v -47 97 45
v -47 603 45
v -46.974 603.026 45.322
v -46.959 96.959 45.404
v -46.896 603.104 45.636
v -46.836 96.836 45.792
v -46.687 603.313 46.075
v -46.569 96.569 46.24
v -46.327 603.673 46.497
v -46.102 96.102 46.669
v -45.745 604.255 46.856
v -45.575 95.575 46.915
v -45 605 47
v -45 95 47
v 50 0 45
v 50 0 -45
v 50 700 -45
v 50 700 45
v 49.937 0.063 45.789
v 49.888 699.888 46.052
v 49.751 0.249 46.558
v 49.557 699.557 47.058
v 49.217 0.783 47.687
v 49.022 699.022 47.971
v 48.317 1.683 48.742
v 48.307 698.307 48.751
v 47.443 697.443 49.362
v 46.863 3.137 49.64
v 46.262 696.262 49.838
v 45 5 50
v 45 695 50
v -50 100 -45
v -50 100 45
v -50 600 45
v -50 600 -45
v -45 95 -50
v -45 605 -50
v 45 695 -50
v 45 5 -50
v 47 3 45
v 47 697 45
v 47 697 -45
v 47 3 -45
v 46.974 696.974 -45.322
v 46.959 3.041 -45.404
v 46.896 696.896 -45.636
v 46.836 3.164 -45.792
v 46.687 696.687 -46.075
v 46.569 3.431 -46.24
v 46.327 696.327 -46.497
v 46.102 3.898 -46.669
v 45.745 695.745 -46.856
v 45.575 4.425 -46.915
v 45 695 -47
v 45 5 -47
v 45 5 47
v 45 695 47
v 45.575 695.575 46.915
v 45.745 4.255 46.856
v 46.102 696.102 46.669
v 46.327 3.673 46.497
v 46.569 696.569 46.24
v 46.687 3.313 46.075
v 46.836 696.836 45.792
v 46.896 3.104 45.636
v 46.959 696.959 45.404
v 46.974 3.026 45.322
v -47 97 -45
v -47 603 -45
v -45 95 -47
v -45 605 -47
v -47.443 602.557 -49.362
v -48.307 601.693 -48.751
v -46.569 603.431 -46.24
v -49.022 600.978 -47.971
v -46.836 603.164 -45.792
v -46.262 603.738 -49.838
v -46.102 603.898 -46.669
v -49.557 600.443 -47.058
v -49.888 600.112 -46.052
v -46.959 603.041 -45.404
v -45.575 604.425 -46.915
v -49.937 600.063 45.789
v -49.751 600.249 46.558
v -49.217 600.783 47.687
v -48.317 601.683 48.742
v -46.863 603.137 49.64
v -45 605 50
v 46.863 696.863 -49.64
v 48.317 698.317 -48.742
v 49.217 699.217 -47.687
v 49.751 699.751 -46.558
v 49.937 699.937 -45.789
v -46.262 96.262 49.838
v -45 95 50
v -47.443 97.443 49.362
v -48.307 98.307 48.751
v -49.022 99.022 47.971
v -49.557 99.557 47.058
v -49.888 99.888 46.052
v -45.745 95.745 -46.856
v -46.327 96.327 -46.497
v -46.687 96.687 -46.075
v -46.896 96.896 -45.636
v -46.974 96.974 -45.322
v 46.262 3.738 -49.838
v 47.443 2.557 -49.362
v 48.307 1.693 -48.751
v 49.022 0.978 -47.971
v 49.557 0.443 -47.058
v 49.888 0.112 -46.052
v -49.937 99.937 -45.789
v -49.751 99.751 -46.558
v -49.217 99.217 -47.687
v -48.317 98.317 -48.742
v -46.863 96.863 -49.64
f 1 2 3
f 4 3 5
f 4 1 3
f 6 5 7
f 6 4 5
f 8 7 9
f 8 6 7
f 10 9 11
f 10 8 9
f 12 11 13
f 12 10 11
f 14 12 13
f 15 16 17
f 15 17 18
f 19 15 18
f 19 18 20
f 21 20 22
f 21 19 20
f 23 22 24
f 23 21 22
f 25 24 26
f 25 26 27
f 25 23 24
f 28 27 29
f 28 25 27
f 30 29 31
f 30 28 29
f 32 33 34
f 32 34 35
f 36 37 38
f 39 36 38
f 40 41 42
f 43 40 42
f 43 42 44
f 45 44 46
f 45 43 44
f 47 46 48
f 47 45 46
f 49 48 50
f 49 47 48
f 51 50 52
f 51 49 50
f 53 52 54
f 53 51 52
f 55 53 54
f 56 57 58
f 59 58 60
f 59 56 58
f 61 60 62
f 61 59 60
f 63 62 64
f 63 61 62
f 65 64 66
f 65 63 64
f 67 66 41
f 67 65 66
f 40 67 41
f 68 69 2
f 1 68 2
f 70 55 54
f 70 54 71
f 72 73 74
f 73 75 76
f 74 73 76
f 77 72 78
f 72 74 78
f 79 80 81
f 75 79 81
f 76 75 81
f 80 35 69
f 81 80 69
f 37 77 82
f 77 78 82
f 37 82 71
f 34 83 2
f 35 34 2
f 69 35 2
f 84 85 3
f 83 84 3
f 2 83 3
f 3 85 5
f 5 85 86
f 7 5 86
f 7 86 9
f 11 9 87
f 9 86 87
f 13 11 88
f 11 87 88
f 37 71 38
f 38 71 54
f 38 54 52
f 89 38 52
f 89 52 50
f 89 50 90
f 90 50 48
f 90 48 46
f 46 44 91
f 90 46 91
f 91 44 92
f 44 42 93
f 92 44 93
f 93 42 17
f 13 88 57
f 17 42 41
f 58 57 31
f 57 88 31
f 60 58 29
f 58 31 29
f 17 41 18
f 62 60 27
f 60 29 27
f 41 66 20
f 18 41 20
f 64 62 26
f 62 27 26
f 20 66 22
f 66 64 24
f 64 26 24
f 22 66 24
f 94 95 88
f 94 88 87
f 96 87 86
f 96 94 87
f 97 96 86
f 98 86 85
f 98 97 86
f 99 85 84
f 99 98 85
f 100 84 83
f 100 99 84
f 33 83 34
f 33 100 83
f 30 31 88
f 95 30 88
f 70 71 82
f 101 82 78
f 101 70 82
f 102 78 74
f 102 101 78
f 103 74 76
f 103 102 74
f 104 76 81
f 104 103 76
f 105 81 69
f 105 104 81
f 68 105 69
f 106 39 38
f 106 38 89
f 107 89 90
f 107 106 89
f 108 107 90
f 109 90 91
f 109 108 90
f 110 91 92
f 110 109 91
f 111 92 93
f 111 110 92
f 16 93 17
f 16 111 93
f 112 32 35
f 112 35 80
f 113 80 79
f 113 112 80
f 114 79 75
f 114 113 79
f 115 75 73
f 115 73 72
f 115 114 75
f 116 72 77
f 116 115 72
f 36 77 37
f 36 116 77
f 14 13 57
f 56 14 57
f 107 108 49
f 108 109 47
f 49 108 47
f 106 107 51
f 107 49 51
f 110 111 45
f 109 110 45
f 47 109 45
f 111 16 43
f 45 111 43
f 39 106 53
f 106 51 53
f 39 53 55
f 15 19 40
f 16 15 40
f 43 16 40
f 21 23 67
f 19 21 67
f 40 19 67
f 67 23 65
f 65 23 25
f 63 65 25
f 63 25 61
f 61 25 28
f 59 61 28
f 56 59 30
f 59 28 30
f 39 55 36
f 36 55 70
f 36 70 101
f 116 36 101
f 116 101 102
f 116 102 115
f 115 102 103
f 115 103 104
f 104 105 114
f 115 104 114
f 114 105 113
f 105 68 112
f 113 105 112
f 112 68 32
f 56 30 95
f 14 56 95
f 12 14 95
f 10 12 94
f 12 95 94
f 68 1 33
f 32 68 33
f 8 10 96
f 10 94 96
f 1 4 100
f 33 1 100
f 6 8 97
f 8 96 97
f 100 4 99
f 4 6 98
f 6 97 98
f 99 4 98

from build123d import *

# Parameters (mm, degrees)
F1_DEPTH = 700
F4_DEPTH = 100.001
F5_DEPTH = 100.001


with BuildPart() as f1:
    # F0 (on Front) → F1 (new body)
    with BuildSketch(Plane.XZ):
        with BuildLine():
            ThreePointArc((50, 45), (48.5355339059, 48.5355339059), (45, 50))
            Line((45, 50), (-45, 50))
            ThreePointArc((-45, 50), (-48.5355339059, 48.5355339059), (-50, 45))
            Line((-50, 45), (-50, -45))
            ThreePointArc((-50, -45), (-48.5355339059, -48.5355339059), (-45, -50))
            Line((-45, -50), (45, -50))
            ThreePointArc((45, -50), (48.5355339059, -48.5355339059), (50, -45))
            Line((50, -45), (50, 45))
        make_face()
        with BuildLine():
            ThreePointArc((-47, 45), (-46.4142135624, 46.4142135624), (-45, 47))
            Line((-45, 47), (45, 47))
            ThreePointArc((45, 47), (46.4142135624, 46.4142135624), (47, 45))
            Line((47, 45), (47, -45))
            ThreePointArc((47, -45), (46.4142135624, -46.4142135624), (45, -47))
            Line((45, -47), (-45, -47))
            ThreePointArc((-45, -47), (-46.4142135624, -46.4142135624), (-47, -45))
            Line((-47, -45), (-47, 45))
        make_face(mode=Mode.SUBTRACT)
    extrude(amount=-F1_DEPTH)

    # F3 (on offset) → F4 (cut, through all)
    with BuildSketch(Plane.XY.offset(50)):
        Polygon((-50, 100), (-50, 0), (50, 0), align=None)
    extrude(amount=-F4_DEPTH, mode=Mode.SUBTRACT)

    # F3 (on offset) → F5 (cut, through all)
    with BuildSketch(Plane.XY.offset(50)):
        Polygon((-50, 100), (-50, 0), (50, 0), align=None)
        Polygon((50, 700), (-50, 700), (-50, 600), align=None)
    extrude(amount=-F5_DEPTH, mode=Mode.SUBTRACT)


solid = f1.part
